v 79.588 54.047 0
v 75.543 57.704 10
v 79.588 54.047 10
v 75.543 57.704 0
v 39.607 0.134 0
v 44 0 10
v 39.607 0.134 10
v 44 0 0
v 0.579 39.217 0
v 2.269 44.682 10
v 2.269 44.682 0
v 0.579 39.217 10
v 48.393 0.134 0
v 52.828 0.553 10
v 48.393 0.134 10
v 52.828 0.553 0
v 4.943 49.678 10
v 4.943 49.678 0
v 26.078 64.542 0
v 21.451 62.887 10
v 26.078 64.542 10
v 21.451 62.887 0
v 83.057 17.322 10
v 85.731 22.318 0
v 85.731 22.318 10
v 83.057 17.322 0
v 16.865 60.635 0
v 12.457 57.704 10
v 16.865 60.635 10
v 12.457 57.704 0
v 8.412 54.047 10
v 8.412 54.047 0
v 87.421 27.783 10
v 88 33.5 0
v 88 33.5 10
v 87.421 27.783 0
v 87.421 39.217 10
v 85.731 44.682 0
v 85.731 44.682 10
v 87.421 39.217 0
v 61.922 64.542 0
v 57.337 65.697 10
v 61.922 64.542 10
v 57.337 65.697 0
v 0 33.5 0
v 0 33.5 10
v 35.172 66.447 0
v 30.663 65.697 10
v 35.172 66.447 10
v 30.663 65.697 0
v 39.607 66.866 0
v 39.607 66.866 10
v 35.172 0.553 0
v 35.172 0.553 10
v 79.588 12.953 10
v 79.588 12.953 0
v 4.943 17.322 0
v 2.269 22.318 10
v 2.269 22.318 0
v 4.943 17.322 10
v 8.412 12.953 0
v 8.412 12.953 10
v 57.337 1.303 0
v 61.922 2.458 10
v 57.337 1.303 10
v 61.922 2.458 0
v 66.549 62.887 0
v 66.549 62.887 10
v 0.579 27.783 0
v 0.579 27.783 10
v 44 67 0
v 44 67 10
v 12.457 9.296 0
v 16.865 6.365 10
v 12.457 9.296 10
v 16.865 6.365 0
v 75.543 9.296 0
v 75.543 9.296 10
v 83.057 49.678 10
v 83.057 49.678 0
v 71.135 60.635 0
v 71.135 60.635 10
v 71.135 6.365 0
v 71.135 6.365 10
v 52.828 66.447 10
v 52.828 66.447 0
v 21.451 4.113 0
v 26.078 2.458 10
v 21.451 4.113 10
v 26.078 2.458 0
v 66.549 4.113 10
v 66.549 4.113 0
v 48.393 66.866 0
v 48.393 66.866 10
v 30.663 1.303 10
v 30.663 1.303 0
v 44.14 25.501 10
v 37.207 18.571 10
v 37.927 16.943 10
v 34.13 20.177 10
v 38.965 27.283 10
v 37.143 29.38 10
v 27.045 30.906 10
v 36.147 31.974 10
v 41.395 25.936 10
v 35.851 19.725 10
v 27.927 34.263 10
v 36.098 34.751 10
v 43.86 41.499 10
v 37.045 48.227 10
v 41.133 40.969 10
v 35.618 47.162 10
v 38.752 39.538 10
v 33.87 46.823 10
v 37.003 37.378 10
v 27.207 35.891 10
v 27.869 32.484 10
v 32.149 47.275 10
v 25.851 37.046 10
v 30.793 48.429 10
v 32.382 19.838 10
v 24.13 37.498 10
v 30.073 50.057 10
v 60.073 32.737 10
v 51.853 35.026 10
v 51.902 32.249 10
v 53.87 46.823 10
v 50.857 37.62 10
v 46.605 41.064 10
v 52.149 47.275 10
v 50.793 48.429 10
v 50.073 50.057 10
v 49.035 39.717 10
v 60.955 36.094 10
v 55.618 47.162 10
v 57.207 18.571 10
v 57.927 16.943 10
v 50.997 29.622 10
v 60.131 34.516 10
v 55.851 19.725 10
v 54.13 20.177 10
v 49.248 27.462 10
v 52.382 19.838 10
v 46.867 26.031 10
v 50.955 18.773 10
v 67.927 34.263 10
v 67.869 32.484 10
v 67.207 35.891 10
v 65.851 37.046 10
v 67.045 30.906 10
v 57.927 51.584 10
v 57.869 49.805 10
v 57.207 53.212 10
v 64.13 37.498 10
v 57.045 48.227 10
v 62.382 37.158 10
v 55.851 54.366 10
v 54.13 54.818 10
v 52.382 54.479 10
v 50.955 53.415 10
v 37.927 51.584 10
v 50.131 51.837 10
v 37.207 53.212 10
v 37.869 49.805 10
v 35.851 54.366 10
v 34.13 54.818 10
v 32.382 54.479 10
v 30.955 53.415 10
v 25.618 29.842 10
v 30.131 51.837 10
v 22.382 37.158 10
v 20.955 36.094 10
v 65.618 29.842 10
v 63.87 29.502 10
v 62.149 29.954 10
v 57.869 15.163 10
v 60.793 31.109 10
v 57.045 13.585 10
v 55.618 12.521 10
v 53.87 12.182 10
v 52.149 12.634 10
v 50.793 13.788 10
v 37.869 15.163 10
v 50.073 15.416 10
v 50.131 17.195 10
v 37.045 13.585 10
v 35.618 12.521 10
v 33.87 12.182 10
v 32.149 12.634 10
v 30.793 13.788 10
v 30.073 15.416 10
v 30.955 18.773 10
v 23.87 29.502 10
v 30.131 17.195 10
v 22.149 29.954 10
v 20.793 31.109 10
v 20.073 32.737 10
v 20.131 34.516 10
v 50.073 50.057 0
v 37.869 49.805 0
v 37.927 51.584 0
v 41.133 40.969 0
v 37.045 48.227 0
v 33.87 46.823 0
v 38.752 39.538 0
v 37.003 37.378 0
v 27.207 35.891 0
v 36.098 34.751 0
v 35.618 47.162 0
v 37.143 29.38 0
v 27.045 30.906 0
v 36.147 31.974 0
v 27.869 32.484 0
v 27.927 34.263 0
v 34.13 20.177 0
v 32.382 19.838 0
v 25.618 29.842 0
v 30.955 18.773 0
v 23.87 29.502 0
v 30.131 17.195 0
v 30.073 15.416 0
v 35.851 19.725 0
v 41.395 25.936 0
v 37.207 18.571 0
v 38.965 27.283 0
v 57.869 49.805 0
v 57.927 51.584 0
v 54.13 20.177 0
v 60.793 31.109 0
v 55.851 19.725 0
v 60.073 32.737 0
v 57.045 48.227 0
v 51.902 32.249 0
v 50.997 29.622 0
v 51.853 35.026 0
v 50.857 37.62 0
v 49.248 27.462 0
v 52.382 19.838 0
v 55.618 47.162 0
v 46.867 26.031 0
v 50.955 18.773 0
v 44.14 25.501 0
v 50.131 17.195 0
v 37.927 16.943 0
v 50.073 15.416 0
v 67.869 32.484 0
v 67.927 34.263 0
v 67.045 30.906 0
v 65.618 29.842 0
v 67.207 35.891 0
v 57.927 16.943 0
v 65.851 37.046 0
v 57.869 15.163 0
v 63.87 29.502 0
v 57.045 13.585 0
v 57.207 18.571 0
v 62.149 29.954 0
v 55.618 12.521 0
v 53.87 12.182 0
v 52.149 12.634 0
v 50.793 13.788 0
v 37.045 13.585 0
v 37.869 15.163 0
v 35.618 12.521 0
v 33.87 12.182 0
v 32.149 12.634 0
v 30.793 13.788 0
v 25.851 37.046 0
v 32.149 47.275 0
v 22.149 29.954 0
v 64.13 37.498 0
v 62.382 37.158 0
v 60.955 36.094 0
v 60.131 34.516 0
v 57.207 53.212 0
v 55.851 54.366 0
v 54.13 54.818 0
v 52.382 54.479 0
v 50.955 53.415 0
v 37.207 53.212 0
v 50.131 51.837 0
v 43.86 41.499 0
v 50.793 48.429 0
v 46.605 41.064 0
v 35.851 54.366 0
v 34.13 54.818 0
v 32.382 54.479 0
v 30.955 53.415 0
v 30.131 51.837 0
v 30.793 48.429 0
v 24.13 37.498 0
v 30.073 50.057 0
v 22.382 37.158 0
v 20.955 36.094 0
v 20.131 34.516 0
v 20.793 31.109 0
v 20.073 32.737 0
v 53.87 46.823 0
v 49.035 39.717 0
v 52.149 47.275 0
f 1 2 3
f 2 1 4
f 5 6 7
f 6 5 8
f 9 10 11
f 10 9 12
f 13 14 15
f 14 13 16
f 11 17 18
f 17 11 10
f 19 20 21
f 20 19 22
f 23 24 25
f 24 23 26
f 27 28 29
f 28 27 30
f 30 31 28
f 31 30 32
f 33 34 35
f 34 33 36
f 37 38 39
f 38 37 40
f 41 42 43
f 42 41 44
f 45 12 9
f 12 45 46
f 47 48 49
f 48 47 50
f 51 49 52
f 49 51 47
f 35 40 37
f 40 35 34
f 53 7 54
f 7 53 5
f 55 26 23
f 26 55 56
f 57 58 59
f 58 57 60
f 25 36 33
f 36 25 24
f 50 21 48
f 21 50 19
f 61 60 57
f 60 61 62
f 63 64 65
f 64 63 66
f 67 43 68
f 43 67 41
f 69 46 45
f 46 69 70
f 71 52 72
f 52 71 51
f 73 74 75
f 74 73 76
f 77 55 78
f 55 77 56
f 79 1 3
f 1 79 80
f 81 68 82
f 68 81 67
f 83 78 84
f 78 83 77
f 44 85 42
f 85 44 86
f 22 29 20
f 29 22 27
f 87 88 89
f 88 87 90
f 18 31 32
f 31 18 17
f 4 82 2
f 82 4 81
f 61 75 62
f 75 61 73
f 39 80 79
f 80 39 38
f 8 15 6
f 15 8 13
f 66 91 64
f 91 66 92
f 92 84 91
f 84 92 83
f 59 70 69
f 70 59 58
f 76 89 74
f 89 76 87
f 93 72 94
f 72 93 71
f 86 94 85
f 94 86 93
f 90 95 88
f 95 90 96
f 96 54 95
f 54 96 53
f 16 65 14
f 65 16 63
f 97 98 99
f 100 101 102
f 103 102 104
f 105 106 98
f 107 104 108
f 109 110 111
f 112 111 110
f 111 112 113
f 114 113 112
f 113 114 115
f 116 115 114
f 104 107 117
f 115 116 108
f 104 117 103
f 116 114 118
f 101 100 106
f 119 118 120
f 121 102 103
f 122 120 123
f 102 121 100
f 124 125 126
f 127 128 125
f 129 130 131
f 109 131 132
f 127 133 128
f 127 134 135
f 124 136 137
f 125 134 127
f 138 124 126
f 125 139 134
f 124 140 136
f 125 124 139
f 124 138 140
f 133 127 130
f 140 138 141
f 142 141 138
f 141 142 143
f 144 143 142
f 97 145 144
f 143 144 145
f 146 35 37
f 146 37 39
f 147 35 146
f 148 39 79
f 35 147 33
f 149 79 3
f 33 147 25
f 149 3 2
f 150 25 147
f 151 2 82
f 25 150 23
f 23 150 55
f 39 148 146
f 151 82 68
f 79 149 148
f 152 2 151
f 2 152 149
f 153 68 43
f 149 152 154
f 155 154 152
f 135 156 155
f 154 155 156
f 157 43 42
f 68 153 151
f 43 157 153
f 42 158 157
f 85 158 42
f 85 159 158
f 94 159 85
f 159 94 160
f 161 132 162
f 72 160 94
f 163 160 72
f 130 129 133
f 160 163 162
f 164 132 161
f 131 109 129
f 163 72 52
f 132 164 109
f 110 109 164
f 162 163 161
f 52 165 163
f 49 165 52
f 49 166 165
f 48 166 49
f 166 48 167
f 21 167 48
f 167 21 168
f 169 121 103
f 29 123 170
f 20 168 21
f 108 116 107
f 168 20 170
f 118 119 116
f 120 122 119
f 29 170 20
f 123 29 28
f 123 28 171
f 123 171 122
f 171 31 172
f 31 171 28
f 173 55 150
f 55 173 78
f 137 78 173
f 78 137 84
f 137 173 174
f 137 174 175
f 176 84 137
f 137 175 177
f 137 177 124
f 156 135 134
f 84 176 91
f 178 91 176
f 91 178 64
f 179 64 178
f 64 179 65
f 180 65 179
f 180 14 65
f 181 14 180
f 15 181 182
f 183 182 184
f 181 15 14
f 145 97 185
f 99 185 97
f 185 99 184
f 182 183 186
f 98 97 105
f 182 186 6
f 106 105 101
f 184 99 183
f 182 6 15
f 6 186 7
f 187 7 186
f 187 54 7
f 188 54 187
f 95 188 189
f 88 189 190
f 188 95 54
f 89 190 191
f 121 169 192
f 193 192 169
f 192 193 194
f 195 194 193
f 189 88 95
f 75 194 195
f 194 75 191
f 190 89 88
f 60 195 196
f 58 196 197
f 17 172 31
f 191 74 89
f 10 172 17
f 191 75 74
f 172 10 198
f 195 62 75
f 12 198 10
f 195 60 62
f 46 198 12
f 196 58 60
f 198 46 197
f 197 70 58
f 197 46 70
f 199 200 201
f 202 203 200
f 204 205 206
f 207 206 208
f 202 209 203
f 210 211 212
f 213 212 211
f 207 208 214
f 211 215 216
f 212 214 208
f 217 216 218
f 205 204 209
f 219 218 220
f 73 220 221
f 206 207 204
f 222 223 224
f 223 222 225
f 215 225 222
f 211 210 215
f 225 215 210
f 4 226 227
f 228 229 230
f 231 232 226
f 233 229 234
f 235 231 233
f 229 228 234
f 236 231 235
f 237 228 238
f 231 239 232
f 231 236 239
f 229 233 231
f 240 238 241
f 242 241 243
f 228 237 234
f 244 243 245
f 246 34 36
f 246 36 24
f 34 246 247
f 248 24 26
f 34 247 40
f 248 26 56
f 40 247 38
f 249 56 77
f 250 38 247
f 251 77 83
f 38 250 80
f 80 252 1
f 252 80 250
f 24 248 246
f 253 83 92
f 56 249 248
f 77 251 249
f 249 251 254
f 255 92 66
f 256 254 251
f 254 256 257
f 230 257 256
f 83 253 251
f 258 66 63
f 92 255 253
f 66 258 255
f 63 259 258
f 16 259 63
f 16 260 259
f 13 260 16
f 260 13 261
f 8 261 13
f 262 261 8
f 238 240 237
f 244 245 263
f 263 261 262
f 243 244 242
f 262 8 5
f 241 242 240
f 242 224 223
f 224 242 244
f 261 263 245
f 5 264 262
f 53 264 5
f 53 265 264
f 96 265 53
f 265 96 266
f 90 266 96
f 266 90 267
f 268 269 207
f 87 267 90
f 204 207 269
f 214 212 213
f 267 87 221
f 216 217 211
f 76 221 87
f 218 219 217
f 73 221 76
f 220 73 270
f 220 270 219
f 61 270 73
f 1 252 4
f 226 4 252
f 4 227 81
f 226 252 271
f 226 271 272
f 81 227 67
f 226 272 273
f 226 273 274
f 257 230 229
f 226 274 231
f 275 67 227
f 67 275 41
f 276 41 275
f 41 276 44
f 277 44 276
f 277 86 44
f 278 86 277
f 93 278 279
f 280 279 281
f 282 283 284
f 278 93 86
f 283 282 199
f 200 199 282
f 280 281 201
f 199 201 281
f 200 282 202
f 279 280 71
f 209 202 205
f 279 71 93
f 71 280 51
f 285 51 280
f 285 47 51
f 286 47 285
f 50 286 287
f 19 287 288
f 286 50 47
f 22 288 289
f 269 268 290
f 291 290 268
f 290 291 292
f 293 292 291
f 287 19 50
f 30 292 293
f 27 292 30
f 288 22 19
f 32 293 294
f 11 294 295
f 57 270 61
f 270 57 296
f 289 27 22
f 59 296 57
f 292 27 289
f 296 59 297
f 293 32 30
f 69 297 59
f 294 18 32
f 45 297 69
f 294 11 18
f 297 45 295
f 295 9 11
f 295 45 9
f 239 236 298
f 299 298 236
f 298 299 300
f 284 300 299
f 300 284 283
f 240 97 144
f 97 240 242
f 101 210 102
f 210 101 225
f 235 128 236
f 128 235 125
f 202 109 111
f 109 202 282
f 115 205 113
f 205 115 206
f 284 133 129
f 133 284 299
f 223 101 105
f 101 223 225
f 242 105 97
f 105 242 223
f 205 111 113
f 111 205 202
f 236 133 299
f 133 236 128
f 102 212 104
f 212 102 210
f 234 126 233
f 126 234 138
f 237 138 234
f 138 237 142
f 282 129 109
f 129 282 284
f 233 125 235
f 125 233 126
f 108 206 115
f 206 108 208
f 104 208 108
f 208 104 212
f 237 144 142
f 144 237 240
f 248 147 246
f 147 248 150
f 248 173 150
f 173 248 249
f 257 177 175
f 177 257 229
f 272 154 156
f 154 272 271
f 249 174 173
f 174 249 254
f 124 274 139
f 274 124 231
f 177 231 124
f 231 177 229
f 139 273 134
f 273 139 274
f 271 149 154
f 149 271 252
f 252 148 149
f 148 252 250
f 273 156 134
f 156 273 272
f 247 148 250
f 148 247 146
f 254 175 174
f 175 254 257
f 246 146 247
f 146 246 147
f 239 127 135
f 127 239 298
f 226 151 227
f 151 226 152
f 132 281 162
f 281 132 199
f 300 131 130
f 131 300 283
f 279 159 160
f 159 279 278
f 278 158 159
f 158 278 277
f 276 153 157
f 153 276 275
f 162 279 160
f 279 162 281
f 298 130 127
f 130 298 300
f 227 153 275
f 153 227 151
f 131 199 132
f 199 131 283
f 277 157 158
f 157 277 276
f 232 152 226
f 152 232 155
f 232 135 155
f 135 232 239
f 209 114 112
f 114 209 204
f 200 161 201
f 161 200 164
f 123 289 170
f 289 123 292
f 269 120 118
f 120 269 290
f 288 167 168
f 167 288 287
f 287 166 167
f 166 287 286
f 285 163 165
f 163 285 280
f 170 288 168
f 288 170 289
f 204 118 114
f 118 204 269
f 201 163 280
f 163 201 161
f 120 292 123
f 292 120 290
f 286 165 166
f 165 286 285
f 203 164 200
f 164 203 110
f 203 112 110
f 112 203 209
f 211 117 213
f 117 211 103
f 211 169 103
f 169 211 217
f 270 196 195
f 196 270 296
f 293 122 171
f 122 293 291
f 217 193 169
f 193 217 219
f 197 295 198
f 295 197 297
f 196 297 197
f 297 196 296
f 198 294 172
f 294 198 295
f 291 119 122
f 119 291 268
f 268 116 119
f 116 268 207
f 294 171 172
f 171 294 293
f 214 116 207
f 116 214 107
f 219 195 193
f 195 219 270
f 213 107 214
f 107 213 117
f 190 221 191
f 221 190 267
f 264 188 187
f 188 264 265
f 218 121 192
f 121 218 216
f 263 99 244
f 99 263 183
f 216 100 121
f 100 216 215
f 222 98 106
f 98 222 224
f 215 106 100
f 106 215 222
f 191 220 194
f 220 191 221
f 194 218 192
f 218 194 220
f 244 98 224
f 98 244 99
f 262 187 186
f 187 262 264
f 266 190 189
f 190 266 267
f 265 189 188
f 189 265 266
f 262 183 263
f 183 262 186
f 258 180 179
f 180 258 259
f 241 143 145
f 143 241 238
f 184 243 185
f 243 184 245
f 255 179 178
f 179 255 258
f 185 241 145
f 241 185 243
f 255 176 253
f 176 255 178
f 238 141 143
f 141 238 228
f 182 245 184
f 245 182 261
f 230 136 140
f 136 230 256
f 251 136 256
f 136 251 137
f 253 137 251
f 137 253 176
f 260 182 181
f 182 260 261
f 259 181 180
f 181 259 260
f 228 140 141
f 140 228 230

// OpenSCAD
$fn = 32;

// ----------------------------------------------------------------------
// Cam plate: double_lobe cam, base R32
// ----------------------------------------------------------------------

// --- parameters (mm) ---
base_r = 32;              // base circle radius
lobe_h = 12;              // cam lobe rise
bore_r = 8;               // shaft bore radius
plate_t = 10;             // plate thickness, Z (extrusion height)
ring_r = 20;              // lightening ring radius
bolt_r = 4;               // lightening hole radius

profile = [[88, 33.5], [87.421, 39.217], [85.731, 44.682], [83.057, 49.678], [79.588, 54.047], [75.543, 57.704], [71.135, 60.635], [66.549, 62.887], [61.922, 64.542], [57.337, 65.697], [52.828, 66.447], [48.393, 66.866], [44, 67], [39.607, 66.866], [35.172, 66.447], [30.663, 65.697], [26.078, 64.542], [21.451, 62.887], [16.865, 60.635], [12.457, 57.704], [8.412, 54.047], [4.943, 49.678], [2.269, 44.682], [0.579, 39.217], [0, 33.5], [0.579, 27.783], [2.269, 22.318], [4.943, 17.322], [8.412, 12.953], [12.457, 9.296], [16.865, 6.365], [21.451, 4.113], [26.078, 2.458], [30.663, 1.303], [35.172, 0.553], [39.607, 0.134], [44, 0], [48.393, 0.134], [52.828, 0.553], [57.337, 1.303], [61.922, 2.458], [66.549, 4.113], [71.135, 6.365], [75.543, 9.296], [79.588, 12.953], [83.057, 17.322], [85.731, 22.318], [87.421, 27.783]];  // primary outline, 48 points, counter clockwise
void_1 = [[51.853, 35.026], [50.857, 37.62], [49.035, 39.717], [46.605, 41.064], [43.86, 41.499], [41.133, 40.969], [38.752, 39.538], [37.003, 37.378], [36.098, 34.751], [36.147, 31.974], [37.143, 29.38], [38.965, 27.283], [41.395, 25.936], [44.14, 25.501], [46.867, 26.031], [49.248, 27.462], [50.997, 29.622], [51.902, 32.249]];  // shaft bore, 18 points
void_2 = [[67.927, 34.263], [67.207, 35.891], [65.851, 37.046], [64.13, 37.498], [62.382, 37.158], [60.955, 36.094], [60.131, 34.516], [60.073, 32.737], [60.793, 31.109], [62.149, 29.954], [63.87, 29.502], [65.618, 29.842], [67.045, 30.906], [67.869, 32.484]];  // lightening hole 1, 14 points
void_3 = [[57.927, 51.584], [57.207, 53.212], [55.851, 54.366], [54.13, 54.818], [52.382, 54.479], [50.955, 53.415], [50.131, 51.837], [50.073, 50.057], [50.793, 48.429], [52.149, 47.275], [53.87, 46.823], [55.618, 47.162], [57.045, 48.227], [57.869, 49.805]];  // lightening hole 2, 14 points
void_4 = [[37.927, 51.584], [37.207, 53.212], [35.851, 54.366], [34.13, 54.818], [32.382, 54.479], [30.955, 53.415], [30.131, 51.837], [30.073, 50.057], [30.793, 48.429], [32.149, 47.275], [33.87, 46.823], [35.618, 47.162], [37.045, 48.227], [37.869, 49.805]];  // lightening hole 3, 14 points
void_5 = [[27.927, 34.263], [27.207, 35.891], [25.851, 37.046], [24.13, 37.498], [22.382, 37.158], [20.955, 36.094], [20.131, 34.516], [20.073, 32.737], [20.793, 31.109], [22.149, 29.954], [23.87, 29.502], [25.618, 29.842], [27.045, 30.906], [27.869, 32.484]];  // lightening hole 4, 14 points
void_6 = [[37.927, 16.943], [37.207, 18.571], [35.851, 19.725], [34.13, 20.177], [32.382, 19.838], [30.955, 18.773], [30.131, 17.195], [30.073, 15.416], [30.793, 13.788], [32.149, 12.634], [33.87, 12.182], [35.618, 12.521], [37.045, 13.585], [37.869, 15.163]];  // lightening hole 5, 14 points
void_7 = [[57.927, 16.943], [57.207, 18.571], [55.851, 19.725], [54.13, 20.177], [52.382, 19.838], [50.955, 18.773], [50.131, 17.195], [50.073, 15.416], [50.793, 13.788], [52.149, 12.634], [53.87, 12.182], [55.618, 12.521], [57.045, 13.585], [57.869, 15.163]];  // lightening hole 6, 14 points

// --- the one profile operation ---
difference() {
  linear_extrude(height = plate_t) polygon(points = profile);
  translate([0, 0, -1])
    linear_extrude(height = plate_t + 2) polygon(points = void_1);
  translate([0, 0, -1])
    linear_extrude(height = plate_t + 2) polygon(points = void_2);
  translate([0, 0, -1])
    linear_extrude(height = plate_t + 2) polygon(points = void_3);
  translate([0, 0, -1])
    linear_extrude(height = plate_t + 2) polygon(points = void_4);
  translate([0, 0, -1])
    linear_extrude(height = plate_t + 2) polygon(points = void_5);
  translate([0, 0, -1])
    linear_extrude(height = plate_t + 2) polygon(points = void_6);
  translate([0, 0, -1])
    linear_extrude(height = plate_t + 2) polygon(points = void_7);
}
